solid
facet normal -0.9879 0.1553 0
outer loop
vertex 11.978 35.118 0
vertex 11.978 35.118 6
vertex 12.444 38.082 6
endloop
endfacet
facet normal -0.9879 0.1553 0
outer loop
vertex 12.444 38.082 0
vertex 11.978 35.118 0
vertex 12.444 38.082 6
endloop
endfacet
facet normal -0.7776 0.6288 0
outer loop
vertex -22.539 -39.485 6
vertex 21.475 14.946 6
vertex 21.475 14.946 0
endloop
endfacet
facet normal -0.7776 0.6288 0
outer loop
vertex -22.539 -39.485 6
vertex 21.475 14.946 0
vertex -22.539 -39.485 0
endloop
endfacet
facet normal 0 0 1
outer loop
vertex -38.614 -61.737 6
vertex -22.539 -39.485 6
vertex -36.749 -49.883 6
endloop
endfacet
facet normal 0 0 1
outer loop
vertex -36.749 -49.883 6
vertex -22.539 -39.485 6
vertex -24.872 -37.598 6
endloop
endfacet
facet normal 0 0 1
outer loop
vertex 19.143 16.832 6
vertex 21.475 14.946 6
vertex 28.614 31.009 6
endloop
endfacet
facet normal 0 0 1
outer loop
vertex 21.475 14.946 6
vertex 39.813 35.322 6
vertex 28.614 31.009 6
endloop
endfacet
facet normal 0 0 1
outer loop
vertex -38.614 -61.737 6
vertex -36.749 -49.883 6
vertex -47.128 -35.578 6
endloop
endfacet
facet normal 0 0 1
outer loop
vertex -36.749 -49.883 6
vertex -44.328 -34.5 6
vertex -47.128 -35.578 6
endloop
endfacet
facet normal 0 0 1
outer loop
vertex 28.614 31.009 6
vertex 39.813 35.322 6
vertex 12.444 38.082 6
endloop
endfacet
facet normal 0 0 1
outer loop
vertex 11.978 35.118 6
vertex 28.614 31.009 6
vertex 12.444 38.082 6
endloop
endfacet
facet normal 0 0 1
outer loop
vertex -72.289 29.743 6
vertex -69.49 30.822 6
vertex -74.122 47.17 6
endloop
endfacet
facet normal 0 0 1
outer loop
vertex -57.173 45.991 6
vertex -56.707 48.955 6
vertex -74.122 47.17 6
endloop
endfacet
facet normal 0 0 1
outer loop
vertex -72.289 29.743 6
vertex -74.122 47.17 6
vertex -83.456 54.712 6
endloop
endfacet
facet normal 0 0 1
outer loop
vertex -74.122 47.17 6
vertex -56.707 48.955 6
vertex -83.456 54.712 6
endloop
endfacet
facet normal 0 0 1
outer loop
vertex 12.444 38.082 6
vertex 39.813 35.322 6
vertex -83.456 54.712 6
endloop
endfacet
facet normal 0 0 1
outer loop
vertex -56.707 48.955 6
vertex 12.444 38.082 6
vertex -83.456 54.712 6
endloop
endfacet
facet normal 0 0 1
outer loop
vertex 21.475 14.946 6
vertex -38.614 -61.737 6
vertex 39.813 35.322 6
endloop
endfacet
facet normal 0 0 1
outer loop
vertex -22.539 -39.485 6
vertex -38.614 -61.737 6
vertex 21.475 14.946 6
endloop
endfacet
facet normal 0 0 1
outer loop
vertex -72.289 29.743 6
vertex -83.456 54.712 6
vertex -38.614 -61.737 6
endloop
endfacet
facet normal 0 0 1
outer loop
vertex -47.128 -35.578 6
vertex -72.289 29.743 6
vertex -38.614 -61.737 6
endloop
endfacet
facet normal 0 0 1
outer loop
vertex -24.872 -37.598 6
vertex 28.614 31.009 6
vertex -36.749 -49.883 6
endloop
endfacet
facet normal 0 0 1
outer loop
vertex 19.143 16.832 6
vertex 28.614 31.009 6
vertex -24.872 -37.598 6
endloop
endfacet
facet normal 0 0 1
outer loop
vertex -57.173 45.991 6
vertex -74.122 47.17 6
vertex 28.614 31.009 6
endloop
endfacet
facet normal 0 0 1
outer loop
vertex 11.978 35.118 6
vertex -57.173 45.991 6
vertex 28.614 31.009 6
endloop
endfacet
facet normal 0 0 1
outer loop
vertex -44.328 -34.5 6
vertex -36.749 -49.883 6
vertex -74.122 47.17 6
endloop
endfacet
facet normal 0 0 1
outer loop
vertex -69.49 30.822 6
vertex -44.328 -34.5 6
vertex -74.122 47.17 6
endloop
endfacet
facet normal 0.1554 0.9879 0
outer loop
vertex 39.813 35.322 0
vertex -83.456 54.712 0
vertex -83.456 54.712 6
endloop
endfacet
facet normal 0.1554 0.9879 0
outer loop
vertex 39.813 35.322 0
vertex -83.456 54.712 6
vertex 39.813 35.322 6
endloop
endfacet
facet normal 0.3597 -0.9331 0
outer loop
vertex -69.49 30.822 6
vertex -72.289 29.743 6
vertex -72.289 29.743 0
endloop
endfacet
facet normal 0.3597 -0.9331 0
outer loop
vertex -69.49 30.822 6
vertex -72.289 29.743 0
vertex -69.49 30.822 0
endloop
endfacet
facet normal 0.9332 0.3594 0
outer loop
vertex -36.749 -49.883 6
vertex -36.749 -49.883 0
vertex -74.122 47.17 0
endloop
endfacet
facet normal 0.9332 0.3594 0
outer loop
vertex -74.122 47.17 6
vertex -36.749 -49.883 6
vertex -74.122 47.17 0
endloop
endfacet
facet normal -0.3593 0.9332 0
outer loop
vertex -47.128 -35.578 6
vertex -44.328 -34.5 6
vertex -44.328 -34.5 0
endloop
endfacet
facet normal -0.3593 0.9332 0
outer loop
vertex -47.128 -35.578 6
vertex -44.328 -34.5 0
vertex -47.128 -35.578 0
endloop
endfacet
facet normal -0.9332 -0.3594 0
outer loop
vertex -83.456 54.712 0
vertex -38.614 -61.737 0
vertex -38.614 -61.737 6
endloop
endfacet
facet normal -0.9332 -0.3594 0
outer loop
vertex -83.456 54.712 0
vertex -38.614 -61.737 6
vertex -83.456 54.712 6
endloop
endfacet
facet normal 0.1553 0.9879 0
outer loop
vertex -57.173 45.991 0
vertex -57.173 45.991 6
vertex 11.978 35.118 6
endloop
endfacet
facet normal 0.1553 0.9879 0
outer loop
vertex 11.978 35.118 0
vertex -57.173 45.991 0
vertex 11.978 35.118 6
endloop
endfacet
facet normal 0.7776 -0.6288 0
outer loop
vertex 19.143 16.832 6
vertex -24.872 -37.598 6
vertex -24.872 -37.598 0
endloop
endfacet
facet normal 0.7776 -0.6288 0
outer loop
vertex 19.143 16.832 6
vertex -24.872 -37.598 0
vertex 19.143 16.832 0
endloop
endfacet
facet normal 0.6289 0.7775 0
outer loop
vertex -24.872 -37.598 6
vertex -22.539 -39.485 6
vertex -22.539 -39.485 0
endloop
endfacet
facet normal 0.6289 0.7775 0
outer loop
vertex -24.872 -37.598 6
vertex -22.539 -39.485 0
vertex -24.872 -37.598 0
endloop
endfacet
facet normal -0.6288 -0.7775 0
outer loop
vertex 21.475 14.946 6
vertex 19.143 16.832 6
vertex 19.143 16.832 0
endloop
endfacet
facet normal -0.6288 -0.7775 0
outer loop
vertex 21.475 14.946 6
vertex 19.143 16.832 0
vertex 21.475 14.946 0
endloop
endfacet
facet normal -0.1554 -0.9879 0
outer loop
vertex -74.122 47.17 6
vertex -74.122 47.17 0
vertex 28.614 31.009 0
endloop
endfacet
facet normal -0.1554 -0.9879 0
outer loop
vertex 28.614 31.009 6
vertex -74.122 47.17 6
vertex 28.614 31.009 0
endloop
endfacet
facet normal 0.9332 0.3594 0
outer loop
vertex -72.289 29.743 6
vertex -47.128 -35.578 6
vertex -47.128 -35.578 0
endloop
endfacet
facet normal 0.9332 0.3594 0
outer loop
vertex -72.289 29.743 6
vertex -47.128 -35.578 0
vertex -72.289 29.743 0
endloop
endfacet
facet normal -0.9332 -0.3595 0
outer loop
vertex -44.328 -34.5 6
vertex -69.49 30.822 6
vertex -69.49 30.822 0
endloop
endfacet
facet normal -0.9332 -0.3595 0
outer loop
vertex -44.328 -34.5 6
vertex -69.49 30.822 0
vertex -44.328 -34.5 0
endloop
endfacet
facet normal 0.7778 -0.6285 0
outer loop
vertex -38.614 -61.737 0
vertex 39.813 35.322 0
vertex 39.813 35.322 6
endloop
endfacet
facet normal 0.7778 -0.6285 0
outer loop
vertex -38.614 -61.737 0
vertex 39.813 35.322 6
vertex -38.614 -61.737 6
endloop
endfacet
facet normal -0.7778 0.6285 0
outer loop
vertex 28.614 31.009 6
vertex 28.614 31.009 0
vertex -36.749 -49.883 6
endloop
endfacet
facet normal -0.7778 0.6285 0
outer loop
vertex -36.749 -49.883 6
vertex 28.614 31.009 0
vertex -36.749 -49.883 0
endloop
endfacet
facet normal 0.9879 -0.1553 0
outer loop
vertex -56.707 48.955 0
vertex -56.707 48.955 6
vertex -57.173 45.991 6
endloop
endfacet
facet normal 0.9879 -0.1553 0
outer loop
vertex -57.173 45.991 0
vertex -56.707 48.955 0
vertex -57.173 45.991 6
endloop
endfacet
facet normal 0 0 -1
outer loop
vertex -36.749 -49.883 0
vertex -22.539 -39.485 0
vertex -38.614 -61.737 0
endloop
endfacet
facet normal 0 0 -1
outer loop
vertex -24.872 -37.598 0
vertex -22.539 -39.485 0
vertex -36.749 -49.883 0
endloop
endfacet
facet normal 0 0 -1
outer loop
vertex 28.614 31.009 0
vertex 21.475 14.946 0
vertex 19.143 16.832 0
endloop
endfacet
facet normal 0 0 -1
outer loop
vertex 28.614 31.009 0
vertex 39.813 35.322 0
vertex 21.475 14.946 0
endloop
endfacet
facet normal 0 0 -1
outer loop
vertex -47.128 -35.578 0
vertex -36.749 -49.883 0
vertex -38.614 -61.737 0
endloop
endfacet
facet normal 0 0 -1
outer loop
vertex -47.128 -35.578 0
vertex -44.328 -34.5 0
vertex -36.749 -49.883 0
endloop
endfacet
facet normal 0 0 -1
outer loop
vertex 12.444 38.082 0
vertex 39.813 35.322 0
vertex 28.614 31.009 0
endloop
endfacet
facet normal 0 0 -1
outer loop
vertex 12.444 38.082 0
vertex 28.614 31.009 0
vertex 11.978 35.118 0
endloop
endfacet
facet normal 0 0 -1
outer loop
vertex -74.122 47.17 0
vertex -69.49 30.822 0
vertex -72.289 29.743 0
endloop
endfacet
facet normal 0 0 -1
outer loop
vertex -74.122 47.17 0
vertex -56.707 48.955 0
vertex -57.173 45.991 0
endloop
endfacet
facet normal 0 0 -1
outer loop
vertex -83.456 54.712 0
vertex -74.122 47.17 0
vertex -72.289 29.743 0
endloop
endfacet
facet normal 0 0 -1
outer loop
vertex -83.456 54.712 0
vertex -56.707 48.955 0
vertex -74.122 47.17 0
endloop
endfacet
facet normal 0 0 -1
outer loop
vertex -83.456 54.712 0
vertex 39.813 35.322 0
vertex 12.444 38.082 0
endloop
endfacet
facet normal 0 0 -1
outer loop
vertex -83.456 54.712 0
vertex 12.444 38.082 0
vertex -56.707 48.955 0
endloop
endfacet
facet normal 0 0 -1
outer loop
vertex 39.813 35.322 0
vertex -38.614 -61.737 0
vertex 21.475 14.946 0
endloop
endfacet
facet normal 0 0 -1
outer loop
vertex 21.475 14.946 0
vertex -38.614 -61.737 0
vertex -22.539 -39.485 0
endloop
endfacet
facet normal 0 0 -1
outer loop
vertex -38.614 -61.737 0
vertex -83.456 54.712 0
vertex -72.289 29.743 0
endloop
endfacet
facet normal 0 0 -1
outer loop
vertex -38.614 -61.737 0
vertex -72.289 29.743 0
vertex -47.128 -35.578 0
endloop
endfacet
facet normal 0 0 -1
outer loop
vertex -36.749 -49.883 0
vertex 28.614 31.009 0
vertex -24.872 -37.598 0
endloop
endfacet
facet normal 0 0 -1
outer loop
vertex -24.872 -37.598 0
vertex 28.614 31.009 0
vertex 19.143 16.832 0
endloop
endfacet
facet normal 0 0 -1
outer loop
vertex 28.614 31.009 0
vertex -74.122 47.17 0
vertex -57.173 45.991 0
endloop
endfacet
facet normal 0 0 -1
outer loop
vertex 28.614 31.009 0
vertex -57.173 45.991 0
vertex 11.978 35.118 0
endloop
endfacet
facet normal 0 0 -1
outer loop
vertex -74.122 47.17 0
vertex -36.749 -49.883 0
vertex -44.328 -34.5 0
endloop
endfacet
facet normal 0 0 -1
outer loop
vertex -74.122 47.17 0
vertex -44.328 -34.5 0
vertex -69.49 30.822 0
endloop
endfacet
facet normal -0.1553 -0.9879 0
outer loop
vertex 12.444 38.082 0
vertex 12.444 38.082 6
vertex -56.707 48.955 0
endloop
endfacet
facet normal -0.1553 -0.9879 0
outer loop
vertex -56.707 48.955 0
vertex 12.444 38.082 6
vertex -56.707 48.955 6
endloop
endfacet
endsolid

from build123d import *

# Parameters (mm, degrees)
BOSS_EXTRU_2_DEPTH      = 6
ENL_V_MAT_EXTRU_2_DEPTH = 10


with BuildPart() as part:
    # Esquisse1 → Boss.-Extru.2 (new body)
    with BuildSketch(Plane.XY):
        Polygon((-83.455959888, 54.712062767), (39.812904953, 35.321710103), (-38.614065462, -61.737082013), align=None)
        Polygon((28.614490816, 31.009457699), (-36.749378522, -49.882844686), (-74.12223269, 47.170077843), align=None, mode=Mode.SUBTRACT)
    extrude(amount=BOSS_EXTRU_2_DEPTH)

    # Esquisse2 → Enlèv. mat.-Extru.2 (cut)
    with BuildSketch(Plane.XY.offset(6)):
        Polygon((-24.872050824, -37.598295416), (19.142614995, 16.832478902), (21.475362465, 14.946136081), (-22.539303353, -39.484638237), align=None)
        Polygon((-57.172566376, 45.990983286), (11.977902, 35.118415816), (12.443869177, 38.082007318), (-56.706599198, 48.954574788), align=None)
        Polygon((-47.127893484, -35.578319674), (-72.28905902, 29.74331341), (-69.48956046, 30.821649076), (-44.328394923, -34.499984009), align=None)
    extrude(amount=-ENL_V_MAT_EXTRU_2_DEPTH, mode=Mode.SUBTRACT)


solid = part.part
